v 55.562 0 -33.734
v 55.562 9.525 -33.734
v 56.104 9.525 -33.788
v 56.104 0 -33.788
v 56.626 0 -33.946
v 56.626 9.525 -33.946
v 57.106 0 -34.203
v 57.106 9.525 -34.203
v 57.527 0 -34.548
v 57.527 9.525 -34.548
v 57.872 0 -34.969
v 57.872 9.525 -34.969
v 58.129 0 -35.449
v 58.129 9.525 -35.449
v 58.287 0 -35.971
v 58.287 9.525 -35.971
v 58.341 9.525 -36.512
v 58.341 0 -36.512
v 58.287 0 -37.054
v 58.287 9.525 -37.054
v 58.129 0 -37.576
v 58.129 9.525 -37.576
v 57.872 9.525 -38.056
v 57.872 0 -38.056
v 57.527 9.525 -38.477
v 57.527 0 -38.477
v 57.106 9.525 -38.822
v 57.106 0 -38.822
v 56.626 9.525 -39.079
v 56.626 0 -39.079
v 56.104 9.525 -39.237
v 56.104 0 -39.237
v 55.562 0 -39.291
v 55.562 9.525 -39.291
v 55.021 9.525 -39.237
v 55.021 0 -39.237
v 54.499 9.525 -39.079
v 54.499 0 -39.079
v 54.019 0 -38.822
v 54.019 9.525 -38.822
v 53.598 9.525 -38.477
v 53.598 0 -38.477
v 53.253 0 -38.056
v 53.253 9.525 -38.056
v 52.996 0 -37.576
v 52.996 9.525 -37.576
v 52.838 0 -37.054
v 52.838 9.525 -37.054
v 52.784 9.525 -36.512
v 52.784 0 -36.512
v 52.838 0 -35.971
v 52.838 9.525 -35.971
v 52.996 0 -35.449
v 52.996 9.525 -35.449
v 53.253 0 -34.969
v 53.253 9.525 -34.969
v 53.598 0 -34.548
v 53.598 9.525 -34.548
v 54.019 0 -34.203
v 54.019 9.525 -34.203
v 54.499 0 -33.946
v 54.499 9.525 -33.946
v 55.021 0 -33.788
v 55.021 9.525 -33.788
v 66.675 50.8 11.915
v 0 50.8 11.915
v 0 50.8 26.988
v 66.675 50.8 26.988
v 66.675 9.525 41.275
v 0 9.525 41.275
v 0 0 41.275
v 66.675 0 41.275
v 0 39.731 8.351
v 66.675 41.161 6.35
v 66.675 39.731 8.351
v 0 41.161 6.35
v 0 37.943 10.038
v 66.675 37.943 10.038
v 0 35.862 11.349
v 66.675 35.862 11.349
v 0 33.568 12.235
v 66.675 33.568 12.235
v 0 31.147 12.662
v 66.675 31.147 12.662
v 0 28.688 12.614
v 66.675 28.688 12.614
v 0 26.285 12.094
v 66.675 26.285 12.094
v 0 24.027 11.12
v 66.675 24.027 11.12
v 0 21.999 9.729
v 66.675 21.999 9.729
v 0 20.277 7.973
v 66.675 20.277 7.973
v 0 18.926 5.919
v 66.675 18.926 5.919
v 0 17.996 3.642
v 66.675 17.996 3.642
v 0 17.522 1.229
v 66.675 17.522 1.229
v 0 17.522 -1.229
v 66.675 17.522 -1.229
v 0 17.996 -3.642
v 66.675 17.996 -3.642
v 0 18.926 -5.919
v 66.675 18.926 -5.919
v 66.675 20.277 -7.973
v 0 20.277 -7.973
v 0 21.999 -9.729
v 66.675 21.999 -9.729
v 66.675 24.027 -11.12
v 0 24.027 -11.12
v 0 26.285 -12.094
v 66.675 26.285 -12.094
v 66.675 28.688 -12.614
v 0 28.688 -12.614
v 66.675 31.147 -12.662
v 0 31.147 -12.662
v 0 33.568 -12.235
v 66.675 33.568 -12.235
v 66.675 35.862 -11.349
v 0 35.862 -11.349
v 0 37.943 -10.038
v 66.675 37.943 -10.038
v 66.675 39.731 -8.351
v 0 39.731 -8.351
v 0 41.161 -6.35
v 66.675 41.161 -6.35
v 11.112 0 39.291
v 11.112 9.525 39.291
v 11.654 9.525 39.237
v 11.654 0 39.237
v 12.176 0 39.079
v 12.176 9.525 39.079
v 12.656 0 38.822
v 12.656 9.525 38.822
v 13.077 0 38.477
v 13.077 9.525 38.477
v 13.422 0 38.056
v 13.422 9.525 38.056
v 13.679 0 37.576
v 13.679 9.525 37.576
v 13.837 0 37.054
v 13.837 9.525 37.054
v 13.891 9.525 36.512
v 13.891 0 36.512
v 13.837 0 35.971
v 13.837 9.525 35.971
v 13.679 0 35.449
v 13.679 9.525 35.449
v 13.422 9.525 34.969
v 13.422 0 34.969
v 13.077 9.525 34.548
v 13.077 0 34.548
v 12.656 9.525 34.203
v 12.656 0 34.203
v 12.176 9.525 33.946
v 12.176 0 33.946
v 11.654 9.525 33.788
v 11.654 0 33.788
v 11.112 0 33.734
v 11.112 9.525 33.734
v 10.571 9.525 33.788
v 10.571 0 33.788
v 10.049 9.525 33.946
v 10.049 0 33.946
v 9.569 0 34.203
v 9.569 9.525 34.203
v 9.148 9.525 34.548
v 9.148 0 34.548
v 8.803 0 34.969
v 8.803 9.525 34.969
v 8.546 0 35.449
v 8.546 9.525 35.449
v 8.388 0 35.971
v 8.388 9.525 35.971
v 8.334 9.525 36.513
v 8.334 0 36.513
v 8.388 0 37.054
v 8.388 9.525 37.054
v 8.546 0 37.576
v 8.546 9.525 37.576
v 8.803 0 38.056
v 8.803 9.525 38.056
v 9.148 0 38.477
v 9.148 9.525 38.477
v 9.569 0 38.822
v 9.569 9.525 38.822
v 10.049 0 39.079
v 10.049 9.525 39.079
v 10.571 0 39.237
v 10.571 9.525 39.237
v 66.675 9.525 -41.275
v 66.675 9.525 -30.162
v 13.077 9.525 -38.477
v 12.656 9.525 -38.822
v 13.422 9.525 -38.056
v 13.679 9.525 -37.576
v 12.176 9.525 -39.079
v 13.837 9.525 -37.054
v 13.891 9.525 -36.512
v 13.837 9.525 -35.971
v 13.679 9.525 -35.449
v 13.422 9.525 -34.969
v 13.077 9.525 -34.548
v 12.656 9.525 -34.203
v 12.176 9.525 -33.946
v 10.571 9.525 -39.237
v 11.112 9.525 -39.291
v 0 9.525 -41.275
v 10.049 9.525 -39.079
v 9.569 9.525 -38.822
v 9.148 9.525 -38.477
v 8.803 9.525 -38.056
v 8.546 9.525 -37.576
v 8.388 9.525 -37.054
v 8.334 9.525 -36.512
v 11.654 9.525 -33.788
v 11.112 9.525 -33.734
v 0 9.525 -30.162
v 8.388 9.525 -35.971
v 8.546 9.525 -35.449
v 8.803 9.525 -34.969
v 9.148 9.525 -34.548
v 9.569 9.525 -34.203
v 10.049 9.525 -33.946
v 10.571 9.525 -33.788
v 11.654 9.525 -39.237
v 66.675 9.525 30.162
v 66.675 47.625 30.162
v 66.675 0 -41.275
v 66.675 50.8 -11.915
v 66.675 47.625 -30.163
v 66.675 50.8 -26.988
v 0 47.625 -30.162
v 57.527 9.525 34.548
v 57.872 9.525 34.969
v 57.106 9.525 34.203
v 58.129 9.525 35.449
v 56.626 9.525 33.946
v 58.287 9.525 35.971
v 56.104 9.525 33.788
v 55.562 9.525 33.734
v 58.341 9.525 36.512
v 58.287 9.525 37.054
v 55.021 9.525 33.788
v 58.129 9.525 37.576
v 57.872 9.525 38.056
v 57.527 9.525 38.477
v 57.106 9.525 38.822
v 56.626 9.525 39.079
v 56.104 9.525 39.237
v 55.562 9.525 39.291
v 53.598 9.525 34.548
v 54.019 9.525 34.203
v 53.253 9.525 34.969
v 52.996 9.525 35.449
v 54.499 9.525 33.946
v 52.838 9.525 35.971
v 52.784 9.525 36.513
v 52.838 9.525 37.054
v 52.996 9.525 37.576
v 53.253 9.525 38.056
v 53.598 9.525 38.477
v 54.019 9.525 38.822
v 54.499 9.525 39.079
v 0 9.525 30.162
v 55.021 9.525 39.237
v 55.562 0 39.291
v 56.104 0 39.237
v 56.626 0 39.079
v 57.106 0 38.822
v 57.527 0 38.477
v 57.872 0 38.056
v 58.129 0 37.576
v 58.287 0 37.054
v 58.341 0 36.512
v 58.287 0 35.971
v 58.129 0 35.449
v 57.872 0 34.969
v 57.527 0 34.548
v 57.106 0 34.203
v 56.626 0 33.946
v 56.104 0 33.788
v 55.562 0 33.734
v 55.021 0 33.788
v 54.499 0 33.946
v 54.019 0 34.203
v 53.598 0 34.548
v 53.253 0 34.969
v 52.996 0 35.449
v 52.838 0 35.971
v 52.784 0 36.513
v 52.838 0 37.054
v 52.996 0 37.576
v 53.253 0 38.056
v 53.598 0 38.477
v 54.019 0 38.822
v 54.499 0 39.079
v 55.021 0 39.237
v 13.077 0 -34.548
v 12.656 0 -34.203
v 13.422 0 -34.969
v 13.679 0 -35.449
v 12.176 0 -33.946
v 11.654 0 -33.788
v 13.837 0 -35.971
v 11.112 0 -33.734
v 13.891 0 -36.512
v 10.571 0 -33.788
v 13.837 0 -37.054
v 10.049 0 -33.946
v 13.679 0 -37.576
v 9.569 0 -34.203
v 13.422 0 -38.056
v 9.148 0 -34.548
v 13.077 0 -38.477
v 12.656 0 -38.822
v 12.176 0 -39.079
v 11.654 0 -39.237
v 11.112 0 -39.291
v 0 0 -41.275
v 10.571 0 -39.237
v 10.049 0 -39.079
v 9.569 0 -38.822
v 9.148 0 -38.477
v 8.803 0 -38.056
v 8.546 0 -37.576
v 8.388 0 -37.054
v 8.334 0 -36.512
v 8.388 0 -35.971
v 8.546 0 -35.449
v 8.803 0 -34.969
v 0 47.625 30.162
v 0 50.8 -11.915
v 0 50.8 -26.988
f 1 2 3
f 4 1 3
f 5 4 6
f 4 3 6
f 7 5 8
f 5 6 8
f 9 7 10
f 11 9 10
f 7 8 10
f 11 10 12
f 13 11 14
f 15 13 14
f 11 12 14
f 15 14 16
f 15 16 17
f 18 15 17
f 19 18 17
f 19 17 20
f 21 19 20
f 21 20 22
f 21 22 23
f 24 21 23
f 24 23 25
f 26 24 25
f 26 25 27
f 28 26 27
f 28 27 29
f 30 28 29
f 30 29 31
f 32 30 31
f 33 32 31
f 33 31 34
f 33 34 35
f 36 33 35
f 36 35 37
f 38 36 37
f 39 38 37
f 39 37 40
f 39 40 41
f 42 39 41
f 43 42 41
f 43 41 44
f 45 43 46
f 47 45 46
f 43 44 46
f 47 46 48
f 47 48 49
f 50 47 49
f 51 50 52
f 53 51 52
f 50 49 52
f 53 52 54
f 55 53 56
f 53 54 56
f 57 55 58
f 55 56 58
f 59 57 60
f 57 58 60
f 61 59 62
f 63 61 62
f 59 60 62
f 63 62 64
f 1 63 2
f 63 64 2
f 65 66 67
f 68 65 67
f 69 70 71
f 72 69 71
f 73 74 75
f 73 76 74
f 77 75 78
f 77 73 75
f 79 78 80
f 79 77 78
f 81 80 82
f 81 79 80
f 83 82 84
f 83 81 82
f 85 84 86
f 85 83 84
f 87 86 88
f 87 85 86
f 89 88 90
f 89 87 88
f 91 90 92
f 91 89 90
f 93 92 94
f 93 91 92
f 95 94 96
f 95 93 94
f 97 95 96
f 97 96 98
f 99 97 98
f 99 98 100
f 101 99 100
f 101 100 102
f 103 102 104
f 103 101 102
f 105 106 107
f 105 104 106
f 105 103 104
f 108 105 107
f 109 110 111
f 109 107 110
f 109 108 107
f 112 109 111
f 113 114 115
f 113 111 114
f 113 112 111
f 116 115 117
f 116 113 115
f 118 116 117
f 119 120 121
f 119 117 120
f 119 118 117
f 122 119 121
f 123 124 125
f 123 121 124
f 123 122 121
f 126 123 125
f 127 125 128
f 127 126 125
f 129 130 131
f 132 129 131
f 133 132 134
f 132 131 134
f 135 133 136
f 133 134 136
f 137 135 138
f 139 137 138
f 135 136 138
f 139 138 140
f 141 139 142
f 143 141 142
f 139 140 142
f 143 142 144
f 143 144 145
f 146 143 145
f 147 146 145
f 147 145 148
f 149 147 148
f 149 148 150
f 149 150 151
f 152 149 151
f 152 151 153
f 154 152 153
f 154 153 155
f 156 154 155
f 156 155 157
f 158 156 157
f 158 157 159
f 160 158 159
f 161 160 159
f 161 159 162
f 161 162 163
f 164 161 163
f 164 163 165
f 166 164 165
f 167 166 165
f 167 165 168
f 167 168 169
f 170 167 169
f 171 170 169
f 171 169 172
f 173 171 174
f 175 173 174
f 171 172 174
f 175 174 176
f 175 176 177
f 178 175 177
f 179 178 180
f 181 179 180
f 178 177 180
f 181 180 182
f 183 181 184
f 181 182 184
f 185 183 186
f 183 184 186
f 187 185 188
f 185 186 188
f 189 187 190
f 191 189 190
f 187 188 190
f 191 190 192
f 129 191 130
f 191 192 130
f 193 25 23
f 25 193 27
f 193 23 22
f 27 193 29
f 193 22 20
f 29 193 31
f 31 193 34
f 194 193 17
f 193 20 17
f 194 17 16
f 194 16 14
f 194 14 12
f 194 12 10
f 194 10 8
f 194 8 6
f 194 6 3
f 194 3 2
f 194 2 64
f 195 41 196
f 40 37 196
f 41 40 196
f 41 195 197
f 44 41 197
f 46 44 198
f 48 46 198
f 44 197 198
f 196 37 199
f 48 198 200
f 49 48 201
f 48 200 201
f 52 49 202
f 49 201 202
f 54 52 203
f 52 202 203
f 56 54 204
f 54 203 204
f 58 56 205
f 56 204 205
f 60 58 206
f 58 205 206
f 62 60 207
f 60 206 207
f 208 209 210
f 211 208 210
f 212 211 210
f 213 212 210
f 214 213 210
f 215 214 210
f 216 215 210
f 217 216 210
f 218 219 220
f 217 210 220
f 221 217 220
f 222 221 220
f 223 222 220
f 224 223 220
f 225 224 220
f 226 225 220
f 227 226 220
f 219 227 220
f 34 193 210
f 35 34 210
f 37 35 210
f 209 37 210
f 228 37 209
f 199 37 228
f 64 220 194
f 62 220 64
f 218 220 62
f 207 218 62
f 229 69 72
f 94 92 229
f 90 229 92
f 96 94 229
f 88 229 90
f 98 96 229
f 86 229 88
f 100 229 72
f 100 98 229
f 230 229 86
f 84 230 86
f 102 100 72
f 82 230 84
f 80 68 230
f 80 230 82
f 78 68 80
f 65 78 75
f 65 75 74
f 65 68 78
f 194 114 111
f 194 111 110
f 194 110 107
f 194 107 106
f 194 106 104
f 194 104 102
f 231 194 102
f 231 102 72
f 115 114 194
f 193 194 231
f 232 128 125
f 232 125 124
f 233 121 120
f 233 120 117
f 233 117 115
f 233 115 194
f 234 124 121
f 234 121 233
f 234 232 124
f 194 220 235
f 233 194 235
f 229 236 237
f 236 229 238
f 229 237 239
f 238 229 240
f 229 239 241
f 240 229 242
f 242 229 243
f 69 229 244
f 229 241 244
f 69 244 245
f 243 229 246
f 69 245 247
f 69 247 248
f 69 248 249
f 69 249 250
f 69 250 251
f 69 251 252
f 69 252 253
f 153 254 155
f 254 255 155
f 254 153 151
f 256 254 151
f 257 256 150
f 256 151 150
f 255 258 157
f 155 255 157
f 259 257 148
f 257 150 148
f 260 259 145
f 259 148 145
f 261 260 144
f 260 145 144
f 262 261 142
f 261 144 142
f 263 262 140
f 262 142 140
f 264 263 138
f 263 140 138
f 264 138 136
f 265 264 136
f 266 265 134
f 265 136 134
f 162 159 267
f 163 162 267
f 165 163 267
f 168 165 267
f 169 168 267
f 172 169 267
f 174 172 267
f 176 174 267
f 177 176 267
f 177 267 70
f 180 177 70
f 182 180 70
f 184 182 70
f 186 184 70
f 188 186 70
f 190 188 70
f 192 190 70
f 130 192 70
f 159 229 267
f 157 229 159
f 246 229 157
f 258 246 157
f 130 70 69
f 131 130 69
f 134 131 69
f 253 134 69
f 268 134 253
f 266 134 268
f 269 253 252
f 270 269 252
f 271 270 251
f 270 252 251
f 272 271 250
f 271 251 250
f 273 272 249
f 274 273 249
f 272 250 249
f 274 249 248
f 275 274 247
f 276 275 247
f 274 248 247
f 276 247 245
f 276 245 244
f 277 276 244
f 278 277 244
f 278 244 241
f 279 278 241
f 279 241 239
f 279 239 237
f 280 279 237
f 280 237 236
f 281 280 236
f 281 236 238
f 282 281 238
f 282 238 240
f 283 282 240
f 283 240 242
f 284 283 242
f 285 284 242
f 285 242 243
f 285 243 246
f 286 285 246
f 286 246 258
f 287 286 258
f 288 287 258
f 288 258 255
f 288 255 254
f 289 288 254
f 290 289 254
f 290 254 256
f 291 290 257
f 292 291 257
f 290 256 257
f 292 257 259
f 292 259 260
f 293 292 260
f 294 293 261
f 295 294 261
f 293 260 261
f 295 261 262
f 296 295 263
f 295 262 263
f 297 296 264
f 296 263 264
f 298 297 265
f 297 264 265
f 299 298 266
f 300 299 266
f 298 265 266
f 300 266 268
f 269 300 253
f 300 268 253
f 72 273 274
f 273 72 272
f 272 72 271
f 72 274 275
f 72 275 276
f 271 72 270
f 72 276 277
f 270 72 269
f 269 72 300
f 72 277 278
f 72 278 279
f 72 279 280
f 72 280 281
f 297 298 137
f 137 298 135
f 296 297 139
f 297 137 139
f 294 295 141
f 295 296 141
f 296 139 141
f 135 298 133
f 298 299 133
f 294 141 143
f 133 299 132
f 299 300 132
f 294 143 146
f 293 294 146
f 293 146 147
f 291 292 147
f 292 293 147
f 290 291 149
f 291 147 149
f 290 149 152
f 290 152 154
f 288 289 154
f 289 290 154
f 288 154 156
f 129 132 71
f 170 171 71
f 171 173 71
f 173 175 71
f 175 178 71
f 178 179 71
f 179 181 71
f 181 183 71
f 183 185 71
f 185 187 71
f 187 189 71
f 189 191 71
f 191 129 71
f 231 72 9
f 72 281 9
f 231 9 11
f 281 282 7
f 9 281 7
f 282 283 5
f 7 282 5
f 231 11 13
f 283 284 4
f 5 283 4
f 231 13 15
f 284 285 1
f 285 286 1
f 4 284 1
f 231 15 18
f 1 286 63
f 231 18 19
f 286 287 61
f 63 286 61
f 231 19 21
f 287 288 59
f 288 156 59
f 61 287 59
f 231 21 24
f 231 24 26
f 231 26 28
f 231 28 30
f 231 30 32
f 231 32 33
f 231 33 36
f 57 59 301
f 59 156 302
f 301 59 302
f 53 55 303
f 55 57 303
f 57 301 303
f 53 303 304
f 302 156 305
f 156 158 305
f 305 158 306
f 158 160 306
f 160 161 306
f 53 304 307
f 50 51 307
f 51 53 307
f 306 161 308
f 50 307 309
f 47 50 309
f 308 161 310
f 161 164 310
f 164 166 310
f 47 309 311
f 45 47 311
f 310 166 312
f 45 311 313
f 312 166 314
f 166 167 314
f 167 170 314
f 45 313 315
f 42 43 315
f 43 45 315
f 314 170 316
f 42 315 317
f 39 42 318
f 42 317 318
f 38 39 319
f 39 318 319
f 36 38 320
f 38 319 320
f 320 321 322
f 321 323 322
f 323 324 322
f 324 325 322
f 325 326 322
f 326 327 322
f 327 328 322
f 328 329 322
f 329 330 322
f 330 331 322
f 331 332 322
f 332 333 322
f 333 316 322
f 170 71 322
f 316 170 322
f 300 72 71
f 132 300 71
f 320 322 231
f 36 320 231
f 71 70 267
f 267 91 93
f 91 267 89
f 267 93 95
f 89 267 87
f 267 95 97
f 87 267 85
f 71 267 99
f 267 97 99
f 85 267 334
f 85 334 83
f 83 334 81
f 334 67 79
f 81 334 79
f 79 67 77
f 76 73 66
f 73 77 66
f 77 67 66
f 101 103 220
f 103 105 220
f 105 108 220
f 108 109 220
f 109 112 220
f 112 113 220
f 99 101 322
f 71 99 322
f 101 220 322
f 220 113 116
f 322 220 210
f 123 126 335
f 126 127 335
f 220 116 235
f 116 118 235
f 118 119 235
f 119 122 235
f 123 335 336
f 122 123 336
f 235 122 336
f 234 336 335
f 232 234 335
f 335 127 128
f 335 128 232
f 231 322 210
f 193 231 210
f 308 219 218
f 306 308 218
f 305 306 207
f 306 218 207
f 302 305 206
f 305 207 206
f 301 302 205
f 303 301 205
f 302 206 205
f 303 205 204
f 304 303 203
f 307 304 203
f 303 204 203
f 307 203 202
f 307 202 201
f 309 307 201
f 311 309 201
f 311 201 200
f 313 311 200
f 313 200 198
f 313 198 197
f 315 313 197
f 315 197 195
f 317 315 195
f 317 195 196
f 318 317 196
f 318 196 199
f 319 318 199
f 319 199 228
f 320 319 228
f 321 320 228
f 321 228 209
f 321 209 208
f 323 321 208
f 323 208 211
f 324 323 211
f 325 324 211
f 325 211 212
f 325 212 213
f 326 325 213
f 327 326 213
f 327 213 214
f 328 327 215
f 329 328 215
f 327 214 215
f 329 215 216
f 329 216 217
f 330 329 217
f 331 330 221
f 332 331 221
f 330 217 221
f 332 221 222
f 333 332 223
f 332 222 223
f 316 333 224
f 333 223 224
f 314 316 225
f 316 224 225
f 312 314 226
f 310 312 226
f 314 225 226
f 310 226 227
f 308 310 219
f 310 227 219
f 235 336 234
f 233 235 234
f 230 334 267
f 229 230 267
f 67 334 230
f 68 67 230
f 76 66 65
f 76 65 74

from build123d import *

# Parameters (mm, degrees)
SKETCH1_R            = 12.7
BASE_EXTRUDE_DEPTH   = 66.675
SKETCH2_R            = 2.778125
CUT_EXTRUDE1_DEPTH   = 89.61606443
LPATTERN1_COUNT      = 2
LPATTERN1_PITCH      = 44.45
LPATTERN1_COUNT_DIR2 = 2
LPATTERN1_PITCH_DIR2 = 73.025
CUT_EXTRUDE2_DEPTH   = 94.433512457
CHAMFER1_SIZE        = 3.175


with BuildPart() as part:
    # Sketch1 → Base-Extrude (new body)
    with BuildSketch(Plane(origin=(0, 0, 0), x_dir=(0, 0, -1), z_dir=(1, 0, 0))):
        Polygon((-41.275, 0), (41.275, 0), (41.275, 9.525), (30.1625, 9.525), (30.1625, 50.8), (-30.1625, 50.8), (-30.1625, 9.525), (-41.275, 9.525), align=None)
        with Locations((0, 30.1625)):
            Circle(SKETCH1_R, mode=Mode.SUBTRACT)
    extrude(amount=BASE_EXTRUDE_DEPTH)

    # Sketch2 → Cut-Extrude1 (cut, through all)
    with BuildSketch(Plane(origin=(0, 9.525, 0), x_dir=(-1, 0, 0), z_dir=(0, 1, 0))):
        with Locations(Location((-55.5625, 36.5125, 0), (0, 0, 90))):
            Circle(SKETCH2_R)
    cut_extrude1 = extrude(amount=-CUT_EXTRUDE1_DEPTH, mode=Mode.SUBTRACT)

    # LPattern1: Cut-Extrude1 2 × 2
    with Locations(*[(-i * LPATTERN1_PITCH, 0, -j * LPATTERN1_PITCH_DIR2) for i in range(LPATTERN1_COUNT) for j in range(LPATTERN1_COUNT_DIR2) if (i, j) != (0, 0)]):
        add(cut_extrude1, mode=Mode.SUBTRACT)

    # Sketch3 → Cut-Extrude2 (cut, through all)
    with BuildSketch(Plane(origin=(66.675, 0, 0), x_dir=(0, 0, -1), z_dir=(1, 0, 0))):
        Polygon((11.91506618, 50.8), (-11.91506618, 50.8), (0, 30.1625), align=None)
    extrude(amount=-CUT_EXTRUDE2_DEPTH, mode=Mode.SUBTRACT)

    # Chamfer1
    chamfer1_edges = [part.edges().sort_by_distance(p)[0] for p in [
        (33.3375, 50.8, 30.1625),
        (33.3375, 50.8, -30.1625),
    ]]
    chamfer(chamfer1_edges, length=CHAMFER1_SIZE)


solid = part.part
